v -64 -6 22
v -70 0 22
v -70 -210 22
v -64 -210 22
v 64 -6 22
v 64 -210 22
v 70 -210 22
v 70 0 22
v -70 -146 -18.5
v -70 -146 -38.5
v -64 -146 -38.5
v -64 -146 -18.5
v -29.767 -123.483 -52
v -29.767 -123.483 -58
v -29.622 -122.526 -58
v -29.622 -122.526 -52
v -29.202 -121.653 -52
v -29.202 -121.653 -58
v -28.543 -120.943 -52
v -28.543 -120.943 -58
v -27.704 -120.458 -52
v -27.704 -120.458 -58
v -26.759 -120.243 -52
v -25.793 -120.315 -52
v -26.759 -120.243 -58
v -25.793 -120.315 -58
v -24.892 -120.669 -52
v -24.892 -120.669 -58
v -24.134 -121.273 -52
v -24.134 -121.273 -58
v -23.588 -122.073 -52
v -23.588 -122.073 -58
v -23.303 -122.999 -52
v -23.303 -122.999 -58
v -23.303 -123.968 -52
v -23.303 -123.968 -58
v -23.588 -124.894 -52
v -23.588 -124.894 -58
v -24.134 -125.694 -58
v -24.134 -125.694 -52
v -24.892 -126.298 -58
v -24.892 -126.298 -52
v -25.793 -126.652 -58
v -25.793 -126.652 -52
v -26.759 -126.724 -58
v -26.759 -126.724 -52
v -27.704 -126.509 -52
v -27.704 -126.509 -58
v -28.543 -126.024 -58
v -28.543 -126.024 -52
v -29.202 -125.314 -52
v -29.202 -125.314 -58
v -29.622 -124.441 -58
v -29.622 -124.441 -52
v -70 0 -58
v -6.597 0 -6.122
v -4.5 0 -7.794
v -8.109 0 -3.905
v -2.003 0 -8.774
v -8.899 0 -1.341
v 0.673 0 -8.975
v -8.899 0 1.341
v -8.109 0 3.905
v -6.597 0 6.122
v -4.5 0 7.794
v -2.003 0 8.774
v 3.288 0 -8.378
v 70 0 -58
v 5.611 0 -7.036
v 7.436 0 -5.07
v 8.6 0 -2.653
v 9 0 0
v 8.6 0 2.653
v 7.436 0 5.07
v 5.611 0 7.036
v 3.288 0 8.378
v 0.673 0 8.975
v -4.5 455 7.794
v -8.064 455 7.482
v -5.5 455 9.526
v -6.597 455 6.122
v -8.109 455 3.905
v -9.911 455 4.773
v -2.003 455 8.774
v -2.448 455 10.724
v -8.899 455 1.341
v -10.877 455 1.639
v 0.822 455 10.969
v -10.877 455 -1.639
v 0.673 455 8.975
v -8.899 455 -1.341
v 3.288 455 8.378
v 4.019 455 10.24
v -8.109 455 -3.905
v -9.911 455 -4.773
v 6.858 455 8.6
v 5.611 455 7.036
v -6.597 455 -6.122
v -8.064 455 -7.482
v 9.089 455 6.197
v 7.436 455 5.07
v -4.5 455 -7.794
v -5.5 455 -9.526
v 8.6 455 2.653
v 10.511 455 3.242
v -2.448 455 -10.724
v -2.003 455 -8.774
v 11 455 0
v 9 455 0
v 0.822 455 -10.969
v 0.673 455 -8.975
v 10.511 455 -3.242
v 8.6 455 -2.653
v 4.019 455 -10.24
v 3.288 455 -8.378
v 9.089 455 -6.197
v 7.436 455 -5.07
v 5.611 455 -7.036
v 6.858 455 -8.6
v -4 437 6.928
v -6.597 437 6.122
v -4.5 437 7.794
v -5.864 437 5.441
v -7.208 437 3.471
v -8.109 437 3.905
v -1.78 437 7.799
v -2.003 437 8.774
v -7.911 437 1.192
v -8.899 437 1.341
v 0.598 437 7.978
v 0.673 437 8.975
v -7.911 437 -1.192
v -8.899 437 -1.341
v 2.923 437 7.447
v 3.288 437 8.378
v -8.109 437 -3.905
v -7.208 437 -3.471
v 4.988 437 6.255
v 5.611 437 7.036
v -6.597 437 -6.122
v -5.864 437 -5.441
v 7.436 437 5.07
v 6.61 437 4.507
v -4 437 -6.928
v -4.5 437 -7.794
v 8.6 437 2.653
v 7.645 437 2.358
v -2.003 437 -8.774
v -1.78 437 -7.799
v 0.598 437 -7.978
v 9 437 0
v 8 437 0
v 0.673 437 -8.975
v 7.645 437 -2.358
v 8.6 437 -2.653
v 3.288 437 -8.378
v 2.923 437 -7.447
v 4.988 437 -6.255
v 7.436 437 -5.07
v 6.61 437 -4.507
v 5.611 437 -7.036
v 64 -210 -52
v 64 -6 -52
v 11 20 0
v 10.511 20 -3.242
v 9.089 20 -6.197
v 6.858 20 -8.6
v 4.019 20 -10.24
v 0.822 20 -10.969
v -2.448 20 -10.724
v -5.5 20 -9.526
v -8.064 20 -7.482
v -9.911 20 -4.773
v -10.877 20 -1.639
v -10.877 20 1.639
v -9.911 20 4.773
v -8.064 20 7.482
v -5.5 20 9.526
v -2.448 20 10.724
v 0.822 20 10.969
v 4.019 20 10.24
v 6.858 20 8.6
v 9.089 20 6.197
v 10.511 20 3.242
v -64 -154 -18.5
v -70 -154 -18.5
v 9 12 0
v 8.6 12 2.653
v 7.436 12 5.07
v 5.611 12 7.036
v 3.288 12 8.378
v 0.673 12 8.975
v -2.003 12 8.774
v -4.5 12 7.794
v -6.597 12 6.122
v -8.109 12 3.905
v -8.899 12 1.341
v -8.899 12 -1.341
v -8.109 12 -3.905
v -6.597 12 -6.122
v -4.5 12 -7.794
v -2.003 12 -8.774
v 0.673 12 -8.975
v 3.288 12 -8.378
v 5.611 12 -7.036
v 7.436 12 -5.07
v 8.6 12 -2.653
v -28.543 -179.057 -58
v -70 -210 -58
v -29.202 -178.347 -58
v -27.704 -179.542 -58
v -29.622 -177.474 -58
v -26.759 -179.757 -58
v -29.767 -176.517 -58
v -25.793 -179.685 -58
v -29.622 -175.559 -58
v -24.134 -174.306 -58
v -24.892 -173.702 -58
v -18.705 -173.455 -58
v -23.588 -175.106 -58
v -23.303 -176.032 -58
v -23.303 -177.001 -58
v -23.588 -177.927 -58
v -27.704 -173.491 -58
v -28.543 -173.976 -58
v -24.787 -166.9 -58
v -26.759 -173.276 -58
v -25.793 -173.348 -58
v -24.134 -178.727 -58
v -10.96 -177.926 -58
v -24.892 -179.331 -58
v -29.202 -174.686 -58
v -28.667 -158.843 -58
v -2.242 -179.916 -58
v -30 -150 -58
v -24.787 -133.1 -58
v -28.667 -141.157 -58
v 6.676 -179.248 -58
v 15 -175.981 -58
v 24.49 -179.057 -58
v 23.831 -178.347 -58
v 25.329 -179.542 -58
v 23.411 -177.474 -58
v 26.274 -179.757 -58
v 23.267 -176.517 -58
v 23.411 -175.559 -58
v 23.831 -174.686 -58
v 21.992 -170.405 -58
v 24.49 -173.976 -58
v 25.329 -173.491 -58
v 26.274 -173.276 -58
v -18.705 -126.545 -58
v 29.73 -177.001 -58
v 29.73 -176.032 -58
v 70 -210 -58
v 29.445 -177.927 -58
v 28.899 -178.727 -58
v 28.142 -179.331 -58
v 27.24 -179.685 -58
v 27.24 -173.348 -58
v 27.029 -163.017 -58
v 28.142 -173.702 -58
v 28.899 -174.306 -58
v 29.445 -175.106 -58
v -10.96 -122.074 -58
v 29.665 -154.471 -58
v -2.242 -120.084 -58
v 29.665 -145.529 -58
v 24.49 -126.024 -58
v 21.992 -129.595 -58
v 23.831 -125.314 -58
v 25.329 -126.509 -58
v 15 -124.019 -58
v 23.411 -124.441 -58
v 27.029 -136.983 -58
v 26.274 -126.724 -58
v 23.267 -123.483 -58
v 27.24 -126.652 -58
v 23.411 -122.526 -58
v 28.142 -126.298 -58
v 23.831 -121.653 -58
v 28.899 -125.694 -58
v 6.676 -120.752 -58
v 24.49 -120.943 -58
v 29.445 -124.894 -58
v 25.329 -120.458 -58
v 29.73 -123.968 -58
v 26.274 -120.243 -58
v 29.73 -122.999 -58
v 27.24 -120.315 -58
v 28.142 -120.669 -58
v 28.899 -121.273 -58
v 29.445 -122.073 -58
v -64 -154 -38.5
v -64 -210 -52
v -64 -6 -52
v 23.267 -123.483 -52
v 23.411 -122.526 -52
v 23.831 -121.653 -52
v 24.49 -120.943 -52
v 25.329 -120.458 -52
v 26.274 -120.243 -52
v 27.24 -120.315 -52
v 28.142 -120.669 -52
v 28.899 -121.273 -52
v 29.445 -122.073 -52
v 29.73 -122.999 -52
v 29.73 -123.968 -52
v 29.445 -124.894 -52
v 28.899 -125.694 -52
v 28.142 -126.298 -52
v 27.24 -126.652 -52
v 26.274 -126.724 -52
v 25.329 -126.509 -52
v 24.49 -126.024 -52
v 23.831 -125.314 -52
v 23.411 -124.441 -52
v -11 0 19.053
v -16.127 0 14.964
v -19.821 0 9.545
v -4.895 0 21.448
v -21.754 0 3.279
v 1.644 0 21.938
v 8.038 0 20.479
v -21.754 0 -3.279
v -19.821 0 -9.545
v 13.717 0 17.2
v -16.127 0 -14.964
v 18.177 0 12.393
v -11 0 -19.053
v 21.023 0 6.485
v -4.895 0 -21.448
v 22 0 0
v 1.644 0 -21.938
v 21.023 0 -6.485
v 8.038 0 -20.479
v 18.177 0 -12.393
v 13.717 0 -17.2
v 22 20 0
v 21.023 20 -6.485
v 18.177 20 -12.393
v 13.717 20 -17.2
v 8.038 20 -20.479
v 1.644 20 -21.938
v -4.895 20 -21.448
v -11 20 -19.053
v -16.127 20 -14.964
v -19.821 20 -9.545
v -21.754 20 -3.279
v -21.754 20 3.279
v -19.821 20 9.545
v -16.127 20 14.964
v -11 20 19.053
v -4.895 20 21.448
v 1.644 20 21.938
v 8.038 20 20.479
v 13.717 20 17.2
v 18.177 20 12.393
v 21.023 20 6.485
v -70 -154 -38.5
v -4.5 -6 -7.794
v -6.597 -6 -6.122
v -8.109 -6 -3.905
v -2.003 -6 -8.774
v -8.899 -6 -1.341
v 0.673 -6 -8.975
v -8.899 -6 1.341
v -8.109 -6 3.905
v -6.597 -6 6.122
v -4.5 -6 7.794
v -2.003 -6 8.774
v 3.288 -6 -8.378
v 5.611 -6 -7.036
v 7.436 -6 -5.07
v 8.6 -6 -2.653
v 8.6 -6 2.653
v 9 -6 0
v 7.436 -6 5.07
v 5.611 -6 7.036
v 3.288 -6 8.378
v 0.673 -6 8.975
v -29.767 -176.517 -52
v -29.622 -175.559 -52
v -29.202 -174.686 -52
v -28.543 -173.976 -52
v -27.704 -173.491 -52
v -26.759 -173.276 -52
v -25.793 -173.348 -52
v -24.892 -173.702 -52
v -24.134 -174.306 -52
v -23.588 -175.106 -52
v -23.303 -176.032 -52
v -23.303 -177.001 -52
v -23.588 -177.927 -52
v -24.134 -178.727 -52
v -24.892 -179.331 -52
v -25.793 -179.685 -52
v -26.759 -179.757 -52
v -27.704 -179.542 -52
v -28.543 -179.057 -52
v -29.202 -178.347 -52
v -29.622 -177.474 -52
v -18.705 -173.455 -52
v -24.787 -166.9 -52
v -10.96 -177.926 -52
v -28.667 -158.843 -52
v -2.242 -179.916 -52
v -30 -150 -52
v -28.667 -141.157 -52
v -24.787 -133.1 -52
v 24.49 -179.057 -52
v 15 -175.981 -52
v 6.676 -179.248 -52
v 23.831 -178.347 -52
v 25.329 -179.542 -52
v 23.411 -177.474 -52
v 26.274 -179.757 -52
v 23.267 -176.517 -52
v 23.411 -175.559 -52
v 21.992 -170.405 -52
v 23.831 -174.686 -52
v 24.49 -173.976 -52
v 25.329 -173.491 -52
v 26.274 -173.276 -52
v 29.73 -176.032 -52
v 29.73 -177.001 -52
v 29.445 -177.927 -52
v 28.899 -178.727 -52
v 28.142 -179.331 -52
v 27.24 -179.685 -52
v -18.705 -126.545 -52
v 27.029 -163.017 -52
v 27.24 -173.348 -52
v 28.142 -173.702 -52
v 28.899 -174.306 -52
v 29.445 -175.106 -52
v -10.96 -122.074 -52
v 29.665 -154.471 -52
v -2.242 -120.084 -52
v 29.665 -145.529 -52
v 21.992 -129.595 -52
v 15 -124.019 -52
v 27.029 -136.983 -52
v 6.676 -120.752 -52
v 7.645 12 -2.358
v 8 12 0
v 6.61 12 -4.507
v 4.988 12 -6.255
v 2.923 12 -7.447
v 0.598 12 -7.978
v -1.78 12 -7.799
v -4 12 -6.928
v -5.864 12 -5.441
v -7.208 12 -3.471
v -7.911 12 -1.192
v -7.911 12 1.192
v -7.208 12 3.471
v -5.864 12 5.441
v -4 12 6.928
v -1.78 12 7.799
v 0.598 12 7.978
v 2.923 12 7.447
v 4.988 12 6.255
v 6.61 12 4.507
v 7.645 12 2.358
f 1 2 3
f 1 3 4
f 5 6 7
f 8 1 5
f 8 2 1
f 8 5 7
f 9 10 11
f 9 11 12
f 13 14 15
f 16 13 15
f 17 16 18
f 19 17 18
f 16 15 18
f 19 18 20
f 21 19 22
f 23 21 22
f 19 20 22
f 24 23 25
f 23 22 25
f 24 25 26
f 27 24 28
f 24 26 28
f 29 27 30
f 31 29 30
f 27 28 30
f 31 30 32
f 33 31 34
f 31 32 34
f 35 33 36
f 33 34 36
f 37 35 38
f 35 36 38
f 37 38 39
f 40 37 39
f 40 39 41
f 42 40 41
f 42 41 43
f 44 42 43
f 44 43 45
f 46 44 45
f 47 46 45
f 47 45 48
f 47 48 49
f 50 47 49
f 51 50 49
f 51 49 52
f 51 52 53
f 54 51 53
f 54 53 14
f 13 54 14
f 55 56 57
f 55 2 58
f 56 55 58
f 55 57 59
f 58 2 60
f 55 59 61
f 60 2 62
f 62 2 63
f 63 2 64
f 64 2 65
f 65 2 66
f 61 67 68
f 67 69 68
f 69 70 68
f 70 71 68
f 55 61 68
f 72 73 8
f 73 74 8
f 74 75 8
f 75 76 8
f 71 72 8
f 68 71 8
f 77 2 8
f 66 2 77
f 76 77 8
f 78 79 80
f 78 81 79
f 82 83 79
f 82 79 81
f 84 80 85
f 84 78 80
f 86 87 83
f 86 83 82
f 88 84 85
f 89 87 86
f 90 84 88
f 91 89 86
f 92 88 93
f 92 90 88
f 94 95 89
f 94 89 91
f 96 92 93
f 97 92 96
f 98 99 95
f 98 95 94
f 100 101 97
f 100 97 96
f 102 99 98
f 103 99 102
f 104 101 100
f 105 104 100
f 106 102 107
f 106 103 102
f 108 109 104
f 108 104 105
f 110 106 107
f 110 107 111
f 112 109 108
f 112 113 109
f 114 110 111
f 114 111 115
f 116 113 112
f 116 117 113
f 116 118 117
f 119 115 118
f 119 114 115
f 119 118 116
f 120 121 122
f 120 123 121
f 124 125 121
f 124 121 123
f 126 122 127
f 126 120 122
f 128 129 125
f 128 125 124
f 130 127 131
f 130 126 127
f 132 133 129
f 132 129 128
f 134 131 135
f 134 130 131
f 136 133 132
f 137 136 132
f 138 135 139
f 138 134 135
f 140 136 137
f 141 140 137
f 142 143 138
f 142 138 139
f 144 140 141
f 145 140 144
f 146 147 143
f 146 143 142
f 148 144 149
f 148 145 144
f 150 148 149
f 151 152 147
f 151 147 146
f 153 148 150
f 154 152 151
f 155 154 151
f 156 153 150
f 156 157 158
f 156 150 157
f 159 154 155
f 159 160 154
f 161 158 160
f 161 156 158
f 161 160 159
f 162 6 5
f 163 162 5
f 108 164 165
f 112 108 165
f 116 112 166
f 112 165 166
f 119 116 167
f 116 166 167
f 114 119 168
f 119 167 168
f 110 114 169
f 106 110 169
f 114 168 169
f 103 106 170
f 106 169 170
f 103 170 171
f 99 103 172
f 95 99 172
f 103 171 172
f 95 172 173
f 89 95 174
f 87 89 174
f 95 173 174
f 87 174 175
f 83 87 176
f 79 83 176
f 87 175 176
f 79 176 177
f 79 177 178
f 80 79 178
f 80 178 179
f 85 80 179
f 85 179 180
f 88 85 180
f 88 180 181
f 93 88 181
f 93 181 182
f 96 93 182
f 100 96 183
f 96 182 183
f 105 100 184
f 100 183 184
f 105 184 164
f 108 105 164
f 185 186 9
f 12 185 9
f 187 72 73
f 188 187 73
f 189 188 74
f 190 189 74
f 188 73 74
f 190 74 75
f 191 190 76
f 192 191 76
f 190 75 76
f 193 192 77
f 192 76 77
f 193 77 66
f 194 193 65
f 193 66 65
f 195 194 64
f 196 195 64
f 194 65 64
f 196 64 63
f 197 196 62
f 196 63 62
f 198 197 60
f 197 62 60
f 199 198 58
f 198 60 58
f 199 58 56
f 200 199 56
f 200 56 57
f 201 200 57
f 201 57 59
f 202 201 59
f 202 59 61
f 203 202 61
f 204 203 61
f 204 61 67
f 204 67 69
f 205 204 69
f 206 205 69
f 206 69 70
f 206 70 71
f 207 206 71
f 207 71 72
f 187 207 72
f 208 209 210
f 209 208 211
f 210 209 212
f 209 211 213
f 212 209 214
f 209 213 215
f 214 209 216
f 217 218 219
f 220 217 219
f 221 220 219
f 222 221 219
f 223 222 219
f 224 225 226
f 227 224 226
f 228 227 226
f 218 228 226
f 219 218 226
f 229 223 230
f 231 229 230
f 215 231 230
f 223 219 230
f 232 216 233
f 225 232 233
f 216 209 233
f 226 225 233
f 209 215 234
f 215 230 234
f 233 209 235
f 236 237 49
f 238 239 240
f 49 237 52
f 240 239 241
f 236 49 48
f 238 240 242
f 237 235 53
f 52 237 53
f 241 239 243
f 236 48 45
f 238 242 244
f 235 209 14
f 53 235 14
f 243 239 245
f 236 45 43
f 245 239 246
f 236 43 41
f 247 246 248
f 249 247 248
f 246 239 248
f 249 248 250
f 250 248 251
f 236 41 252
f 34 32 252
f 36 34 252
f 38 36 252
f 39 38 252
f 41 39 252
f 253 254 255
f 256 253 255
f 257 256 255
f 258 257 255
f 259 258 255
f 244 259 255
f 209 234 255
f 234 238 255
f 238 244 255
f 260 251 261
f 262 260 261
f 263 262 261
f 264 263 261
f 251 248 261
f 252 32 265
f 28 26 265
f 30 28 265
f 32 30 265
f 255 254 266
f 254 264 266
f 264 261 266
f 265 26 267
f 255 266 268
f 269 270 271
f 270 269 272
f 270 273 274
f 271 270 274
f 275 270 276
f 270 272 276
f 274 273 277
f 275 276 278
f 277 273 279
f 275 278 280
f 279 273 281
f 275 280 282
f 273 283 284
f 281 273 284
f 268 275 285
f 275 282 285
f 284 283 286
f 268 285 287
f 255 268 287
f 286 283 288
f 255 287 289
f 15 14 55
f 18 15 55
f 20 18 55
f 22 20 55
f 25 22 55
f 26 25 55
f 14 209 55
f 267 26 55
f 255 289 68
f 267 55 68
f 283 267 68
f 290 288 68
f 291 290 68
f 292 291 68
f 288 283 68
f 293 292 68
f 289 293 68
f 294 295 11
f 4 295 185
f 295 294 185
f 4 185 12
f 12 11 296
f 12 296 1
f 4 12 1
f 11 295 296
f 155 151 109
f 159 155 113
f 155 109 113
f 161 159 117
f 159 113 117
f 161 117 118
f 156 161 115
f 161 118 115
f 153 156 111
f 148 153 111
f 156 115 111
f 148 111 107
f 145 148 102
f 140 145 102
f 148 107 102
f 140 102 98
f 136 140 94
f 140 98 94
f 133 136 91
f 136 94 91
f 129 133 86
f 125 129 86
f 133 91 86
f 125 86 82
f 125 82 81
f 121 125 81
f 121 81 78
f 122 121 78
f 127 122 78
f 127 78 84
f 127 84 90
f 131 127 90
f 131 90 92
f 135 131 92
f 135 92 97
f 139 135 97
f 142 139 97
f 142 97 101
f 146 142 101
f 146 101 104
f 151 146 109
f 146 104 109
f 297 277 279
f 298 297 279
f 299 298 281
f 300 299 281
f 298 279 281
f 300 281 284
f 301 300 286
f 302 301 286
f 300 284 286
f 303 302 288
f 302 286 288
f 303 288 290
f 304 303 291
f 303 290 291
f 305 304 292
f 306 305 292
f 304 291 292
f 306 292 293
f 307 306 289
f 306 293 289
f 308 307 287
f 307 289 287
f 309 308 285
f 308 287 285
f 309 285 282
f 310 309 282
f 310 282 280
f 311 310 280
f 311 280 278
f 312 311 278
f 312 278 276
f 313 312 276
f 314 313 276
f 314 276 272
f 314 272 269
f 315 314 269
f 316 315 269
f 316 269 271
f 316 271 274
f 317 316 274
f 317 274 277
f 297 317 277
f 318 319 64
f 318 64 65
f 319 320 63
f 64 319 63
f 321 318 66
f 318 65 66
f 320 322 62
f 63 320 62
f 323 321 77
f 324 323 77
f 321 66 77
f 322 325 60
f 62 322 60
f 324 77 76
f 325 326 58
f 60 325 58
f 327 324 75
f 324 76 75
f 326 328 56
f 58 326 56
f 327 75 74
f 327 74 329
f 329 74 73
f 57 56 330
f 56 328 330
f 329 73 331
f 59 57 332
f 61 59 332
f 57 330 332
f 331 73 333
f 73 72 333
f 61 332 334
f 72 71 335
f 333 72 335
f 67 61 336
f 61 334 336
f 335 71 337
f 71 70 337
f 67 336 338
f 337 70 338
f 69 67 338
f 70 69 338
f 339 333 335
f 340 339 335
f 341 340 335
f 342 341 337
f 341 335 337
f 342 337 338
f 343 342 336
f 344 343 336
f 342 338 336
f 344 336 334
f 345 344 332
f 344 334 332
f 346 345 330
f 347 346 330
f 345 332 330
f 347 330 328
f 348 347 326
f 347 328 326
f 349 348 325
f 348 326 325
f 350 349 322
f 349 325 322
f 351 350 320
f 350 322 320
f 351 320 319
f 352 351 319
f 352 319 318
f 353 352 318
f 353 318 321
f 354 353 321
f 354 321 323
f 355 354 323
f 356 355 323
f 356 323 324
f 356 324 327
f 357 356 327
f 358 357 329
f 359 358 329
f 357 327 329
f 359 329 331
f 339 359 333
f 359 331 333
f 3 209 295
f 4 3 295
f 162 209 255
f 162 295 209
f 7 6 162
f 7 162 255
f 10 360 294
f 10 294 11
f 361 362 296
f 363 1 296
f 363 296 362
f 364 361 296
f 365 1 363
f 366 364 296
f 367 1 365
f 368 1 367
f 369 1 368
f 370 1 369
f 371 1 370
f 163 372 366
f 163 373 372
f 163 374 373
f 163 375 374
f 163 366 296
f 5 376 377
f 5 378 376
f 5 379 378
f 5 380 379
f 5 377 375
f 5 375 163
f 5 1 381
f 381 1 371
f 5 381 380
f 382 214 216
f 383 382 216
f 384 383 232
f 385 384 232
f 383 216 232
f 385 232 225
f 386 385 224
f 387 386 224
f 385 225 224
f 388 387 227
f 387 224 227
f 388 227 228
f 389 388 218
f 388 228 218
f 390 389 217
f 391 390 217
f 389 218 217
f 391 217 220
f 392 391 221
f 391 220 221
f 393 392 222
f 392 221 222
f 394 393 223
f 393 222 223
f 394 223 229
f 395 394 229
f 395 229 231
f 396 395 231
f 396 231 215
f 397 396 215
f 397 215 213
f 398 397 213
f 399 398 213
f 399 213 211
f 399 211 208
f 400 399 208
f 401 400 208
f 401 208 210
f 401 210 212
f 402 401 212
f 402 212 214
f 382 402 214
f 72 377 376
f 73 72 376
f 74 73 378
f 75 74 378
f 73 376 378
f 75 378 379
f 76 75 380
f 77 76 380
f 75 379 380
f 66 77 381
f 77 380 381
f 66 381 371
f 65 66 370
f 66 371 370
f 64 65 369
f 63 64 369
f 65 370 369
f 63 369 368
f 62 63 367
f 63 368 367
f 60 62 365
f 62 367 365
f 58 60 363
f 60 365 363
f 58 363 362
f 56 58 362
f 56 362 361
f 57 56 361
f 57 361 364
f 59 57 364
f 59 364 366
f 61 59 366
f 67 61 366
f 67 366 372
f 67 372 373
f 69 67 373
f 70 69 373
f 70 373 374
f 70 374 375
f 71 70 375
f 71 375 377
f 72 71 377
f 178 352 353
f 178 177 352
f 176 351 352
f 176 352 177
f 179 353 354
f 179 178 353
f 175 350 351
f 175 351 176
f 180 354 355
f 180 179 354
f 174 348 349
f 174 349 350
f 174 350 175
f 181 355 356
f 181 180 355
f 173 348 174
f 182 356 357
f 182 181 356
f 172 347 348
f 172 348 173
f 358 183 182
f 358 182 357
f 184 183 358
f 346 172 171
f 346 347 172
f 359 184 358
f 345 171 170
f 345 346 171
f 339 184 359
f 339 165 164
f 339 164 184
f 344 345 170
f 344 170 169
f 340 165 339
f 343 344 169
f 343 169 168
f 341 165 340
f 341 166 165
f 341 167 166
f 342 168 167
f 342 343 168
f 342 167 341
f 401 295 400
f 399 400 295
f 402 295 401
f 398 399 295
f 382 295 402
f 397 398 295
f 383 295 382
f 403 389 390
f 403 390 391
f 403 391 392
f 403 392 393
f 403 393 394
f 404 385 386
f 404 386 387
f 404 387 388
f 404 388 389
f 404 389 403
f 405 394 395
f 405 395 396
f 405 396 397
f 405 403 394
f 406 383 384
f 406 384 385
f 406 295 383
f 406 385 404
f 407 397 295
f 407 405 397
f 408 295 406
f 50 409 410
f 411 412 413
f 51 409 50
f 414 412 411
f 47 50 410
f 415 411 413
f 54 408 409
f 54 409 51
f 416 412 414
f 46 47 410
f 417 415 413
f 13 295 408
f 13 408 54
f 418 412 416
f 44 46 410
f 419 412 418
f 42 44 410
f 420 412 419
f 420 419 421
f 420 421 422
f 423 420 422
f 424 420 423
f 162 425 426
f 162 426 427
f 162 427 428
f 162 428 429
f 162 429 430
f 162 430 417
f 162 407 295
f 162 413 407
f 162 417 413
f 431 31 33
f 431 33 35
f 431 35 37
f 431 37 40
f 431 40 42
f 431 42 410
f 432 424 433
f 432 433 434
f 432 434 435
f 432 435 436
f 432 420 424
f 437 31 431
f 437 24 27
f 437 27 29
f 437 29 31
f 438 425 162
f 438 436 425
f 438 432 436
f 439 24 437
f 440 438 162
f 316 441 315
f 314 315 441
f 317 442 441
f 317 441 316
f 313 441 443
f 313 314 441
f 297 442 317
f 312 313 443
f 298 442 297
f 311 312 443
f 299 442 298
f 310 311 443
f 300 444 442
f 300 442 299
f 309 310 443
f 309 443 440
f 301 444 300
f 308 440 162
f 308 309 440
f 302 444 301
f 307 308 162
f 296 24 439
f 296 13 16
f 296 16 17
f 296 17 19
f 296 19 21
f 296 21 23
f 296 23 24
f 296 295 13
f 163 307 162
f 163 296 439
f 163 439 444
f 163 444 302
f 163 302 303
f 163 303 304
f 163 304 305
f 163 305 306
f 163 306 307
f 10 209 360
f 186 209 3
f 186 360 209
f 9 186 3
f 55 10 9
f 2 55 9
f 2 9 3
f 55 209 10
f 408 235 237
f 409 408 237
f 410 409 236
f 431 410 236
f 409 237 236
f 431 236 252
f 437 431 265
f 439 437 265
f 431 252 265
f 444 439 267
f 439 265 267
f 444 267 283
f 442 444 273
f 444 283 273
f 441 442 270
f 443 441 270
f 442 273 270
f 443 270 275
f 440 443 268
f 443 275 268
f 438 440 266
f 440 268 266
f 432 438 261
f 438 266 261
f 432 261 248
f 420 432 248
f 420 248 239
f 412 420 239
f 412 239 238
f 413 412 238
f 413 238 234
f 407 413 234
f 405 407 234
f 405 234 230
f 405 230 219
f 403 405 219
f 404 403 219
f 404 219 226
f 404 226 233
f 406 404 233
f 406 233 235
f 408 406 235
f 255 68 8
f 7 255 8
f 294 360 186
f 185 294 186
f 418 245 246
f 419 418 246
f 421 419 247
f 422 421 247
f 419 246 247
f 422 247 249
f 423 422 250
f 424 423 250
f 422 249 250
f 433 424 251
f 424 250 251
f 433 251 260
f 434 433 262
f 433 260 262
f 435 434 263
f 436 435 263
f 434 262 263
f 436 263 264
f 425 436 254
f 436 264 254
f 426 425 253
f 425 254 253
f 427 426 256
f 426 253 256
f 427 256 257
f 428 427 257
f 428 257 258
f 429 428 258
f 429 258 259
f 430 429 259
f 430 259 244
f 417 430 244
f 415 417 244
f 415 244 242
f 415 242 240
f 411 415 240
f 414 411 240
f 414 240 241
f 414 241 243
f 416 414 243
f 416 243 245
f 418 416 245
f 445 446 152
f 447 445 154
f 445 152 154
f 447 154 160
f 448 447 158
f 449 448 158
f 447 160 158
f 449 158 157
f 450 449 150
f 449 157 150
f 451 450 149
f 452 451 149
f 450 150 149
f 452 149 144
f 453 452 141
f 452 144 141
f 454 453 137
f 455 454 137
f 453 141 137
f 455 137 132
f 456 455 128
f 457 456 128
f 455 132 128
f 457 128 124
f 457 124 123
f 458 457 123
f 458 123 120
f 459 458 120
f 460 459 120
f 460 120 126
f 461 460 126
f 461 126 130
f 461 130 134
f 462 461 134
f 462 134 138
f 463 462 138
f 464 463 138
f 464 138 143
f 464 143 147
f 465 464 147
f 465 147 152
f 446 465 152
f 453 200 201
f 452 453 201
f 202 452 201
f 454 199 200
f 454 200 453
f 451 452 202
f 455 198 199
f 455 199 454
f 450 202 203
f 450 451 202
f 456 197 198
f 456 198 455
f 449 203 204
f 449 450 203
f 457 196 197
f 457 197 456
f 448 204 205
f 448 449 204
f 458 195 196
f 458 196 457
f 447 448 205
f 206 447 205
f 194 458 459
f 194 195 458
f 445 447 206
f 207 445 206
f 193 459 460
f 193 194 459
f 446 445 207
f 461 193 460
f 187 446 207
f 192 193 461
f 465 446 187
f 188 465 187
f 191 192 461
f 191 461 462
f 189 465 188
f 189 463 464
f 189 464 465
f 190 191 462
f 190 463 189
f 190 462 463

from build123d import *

# Parameters (mm, degrees)
SKETCH_1_R          = 22
EXTRUDE_1_DEPTH     = 20
SKETCH_2_R          = 11
EXTRUDE_2_DEPTH     = 435
SKETCH_4_W          = 140
SKETCH_4_H          = 80
EXTRUDE_3_DEPTH     = 210
SHELL_2_T           = -6
SKETCH_3_R          = 8
CUT_EXTRUDE_2_DEPTH = 461
SKETCH_5_W          = 128
SKETCH_5_H          = 6
CUT_EXTRUDE_3_DEPTH = 74
SKETCH_6_R          = 30
SKETCH_6_R_2        = 3.25
CUT_EXTRUDE_4_DEPTH = 10
SKETCH_7_R          = 9
CUT_EXTRUDE_5_DEPTH = 18
SKETCH_8_R          = 9
CUT_EXTRUDE_6_DEPTH = 18
SKETCH_9_W          = 20
SKETCH_9_H          = 8
CUT_EXTRUDE_7_DEPTH = 10


with BuildPart() as part:
    # 草图1 → 凸台-拉伸1 (new body)
    with BuildSketch(Plane(origin=(0, 0, 0), x_dir=(1, 0, 0), z_dir=(0, 1, 0))):
        Circle(SKETCH_1_R)
    extrude(amount=EXTRUDE_1_DEPTH)

    # 草图2 → 凸台-拉伸2 (add)
    with BuildSketch(Plane(origin=(0, 20, 0), x_dir=(1, 0, 0), z_dir=(0, 1, 0))):
        Circle(SKETCH_2_R)
    extrude(amount=EXTRUDE_2_DEPTH)


with BuildPart() as body_2:
    # 草图4 → 凸台-拉伸3 (new body)
    with BuildSketch(Plane.XZ):
        with Locations((0, -18)):
            Rectangle(SKETCH_4_W, SKETCH_4_H)
    extrude(amount=EXTRUDE_3_DEPTH)

    # 抽壳2
    shell_2_openings = [body_2.faces().sort_by_distance(p)[0] for p in [
        (0, -105, 22),
    ]]
    offset(amount=SHELL_2_T, openings=shell_2_openings, kind=Kind.INTERSECTION)


with BuildPart() as cut_extrude_2_tool:
    # 草图3 → 切除-拉伸2 (new body)
    with BuildSketch(Plane(origin=(0, 455, 0), x_dir=(1, 0, 0), z_dir=(0, 1, 0))):
        Circle(SKETCH_3_R)
    extrude(amount=-CUT_EXTRUDE_2_DEPTH)


with BuildPart() as part_1:
    add(part.part)

    # 切除-拉伸2: cut by cut_extrude_2_tool
    add(cut_extrude_2_tool.part, mode=Mode.SUBTRACT)

    # 草图7 → 切除-拉伸5 (cut)
    with BuildSketch(Plane(origin=(0, 455, 0), x_dir=(1, 0, 0), z_dir=(0, 1, 0))):
        Circle(SKETCH_7_R)
    extrude(amount=-CUT_EXTRUDE_5_DEPTH, mode=Mode.SUBTRACT)


with BuildPart() as body_2_1:
    add(body_2.part)

    # 切除-拉伸2: cut by cut_extrude_2_tool
    add(cut_extrude_2_tool.part, mode=Mode.SUBTRACT)

    # 草图5 → 切除-拉伸3 (cut)
    with BuildSketch(Plane.XY.offset(22)):
        with Locations((0, -207)):
            Rectangle(SKETCH_5_W, SKETCH_5_H)
    extrude(amount=-CUT_EXTRUDE_3_DEPTH, mode=Mode.SUBTRACT)

    # 草图6 → 切除-拉伸4 (cut)
    with BuildSketch(Plane(origin=(0, 0, -58), x_dir=(-1, 0, 0), z_dir=(0, 0, -1))):
        with Locations((0, -150)):
            Circle(SKETCH_6_R)
        with Locations((26.516504294, -123.483495706)):
            Circle(SKETCH_6_R_2)
        with Locations((26.516504294, -176.516504294)):
            Circle(SKETCH_6_R_2)
        with Locations((-26.516504294, -176.516504294)):
            Circle(SKETCH_6_R_2)
        with Locations((-26.516504294, -123.483495706)):
            Circle(SKETCH_6_R_2)
    extrude(amount=-CUT_EXTRUDE_4_DEPTH, mode=Mode.SUBTRACT)


with BuildPart() as cut_extrude_6_tool:
    # 草图8 → 切除-拉伸6 (new body)
    with BuildSketch(Plane.XZ.offset(6)):
        Circle(SKETCH_8_R)
    extrude(amount=-CUT_EXTRUDE_6_DEPTH)


with BuildPart() as part_2:
    add(part_1.part)

    # 切除-拉伸6: cut by cut_extrude_6_tool
    add(cut_extrude_6_tool.part, mode=Mode.SUBTRACT)


with BuildPart() as body_2_2:
    add(body_2_1.part)

    # 切除-拉伸6: cut by cut_extrude_6_tool
    add(cut_extrude_6_tool.part, mode=Mode.SUBTRACT)

    # 草图9 → 切除-拉伸7 (cut)
    with BuildSketch(Plane.ZY.offset(70)):
        with Locations((-28.5, -150)):
            Rectangle(SKETCH_9_W, SKETCH_9_H)
    extrude(amount=-CUT_EXTRUDE_7_DEPTH, mode=Mode.SUBTRACT)


solid = Compound([part_2.part, body_2_2.part])
